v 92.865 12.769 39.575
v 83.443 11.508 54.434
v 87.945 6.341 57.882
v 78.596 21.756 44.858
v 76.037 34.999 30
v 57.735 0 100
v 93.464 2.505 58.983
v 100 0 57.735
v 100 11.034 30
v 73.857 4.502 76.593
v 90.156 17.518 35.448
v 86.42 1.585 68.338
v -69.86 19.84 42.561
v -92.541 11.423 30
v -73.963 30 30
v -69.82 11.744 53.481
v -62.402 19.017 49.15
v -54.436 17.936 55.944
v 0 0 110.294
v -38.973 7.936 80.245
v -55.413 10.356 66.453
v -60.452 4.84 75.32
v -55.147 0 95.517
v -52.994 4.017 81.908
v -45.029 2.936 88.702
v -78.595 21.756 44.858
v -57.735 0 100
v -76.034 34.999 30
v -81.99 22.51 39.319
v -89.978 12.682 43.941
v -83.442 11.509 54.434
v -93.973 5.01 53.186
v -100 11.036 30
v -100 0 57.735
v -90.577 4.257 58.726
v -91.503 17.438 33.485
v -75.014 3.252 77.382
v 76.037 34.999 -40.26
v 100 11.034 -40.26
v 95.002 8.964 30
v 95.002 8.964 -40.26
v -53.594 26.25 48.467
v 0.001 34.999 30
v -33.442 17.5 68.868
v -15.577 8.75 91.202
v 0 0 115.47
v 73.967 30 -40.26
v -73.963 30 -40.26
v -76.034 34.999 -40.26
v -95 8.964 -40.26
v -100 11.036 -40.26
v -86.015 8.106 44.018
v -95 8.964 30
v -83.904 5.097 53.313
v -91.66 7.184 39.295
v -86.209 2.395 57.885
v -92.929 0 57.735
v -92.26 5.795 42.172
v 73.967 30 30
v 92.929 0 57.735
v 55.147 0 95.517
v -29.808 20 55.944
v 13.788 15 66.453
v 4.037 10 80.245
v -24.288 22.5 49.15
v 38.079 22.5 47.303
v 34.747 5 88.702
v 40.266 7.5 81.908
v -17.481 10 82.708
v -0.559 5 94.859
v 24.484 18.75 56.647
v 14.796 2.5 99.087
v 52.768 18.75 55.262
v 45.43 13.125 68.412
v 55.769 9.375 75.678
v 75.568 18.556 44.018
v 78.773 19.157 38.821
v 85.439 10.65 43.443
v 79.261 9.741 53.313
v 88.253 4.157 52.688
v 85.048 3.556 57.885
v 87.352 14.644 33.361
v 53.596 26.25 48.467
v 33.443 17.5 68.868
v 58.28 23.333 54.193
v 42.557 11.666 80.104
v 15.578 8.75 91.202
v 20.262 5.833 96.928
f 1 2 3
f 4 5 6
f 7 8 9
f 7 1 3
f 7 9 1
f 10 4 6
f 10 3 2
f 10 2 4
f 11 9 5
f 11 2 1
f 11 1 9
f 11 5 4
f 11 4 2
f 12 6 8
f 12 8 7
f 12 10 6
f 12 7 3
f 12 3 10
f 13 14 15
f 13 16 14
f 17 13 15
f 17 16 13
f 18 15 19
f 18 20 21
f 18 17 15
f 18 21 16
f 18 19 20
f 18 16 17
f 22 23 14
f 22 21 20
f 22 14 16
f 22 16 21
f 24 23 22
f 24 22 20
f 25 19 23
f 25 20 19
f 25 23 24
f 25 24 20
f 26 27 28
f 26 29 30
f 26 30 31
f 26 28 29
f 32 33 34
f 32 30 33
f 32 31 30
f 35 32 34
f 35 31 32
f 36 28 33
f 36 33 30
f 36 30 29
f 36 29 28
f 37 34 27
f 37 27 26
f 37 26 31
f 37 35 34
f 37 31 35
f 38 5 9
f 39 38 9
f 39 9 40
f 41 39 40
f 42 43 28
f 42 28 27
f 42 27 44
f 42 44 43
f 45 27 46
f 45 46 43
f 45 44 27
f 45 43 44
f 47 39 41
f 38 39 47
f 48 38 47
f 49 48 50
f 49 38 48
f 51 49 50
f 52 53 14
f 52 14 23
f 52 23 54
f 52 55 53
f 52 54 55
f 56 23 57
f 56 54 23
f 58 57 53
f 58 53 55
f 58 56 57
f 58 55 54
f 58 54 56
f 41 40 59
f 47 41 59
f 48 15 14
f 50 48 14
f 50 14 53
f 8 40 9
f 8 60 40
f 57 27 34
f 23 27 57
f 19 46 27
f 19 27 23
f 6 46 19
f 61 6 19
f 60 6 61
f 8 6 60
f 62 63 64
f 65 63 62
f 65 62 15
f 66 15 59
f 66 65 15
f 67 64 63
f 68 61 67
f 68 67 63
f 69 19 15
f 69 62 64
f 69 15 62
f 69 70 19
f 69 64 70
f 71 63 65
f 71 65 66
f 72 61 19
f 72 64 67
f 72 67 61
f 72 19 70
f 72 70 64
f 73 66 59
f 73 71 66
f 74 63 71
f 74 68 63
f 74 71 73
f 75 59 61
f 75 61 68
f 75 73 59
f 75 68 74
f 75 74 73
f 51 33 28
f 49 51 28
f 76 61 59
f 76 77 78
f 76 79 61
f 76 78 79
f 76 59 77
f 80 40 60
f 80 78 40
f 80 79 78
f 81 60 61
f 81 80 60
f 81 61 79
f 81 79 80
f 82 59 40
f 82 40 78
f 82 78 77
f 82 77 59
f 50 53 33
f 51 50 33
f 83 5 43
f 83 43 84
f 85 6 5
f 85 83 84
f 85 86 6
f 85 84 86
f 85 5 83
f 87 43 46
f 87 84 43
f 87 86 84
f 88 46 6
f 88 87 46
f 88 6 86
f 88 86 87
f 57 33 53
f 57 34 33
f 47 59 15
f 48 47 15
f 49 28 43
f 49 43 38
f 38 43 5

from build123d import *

# Parameters (mm, degrees)
BOSS_EXTRUDE1_DEPTH = 70.26


with BuildPart() as part:
    # Loft13: read off the stored shape, not the designer's step
    # Loft13: loft between two sections, ruled curve by curve
    loft13_from = [
        Edge.make_bspline([(-100.000171146, 11.035604797, 30), (-99.166809288, 10.690415013, 30), (-98.33344743, 10.345225229, 30), (-96.666723715, 9.654845662, 30), (-95.833361858, 9.309655878, 30), (-95, 8.964466094, 30)], [0, 0, 0, 0, 0.5, 0.5, 1, 1, 1, 1], 3),
        Edge.make_bspline([(-95, 8.964466094, 30), (-94.590223449, 9.374207863, 30), (-94.180446899, 9.783949632, 30), (-93.360893797, 10.603433171, 30), (-92.951117247, 11.01317494, 30), (-92.541340696, 11.422916709, 30)], [0, 0, 0, 0, 0.5, 0.5, 1, 1, 1, 1], 3),
        Edge.make_bspline([(-76.034367882, 34.999373863, 30), (-80.028668426, 31.005412352, 30), (-84.02296897, 27.011450841, 30), (-92.011570058, 19.023527819, 30), (-96.005870602, 15.029566308, 30), (-100.000171146, 11.035604797, 30)], [0, 0, 0, 0, 0.5, 0.5, 1, 1, 1, 1], 3),
        Edge.make_bspline([(-92.541340696, 11.422916709, 30), (-89.444897324, 14.519097257, 30), (-86.348453952, 17.615277806, 30), (-80.155567208, 23.807638903, 30), (-77.059123835, 26.903819451, 30), (-73.962680463, 30, 30)], [0, 0, 0, 0, 0.5, 0.5, 1, 1, 1, 1], 3),
        Edge.make_bspline([(-73.962680463, 30, 30), (-49.307680463, 30, 30), (-24.652680463, 30, 30), (24.657319537, 30, 30), (49.312319537, 30, 30), (73.967319537, 30, 30)], [0, 0, 0, 0, 0.5, 0.5, 1, 1, 1, 1], 3),
        Edge.make_bspline([(73.967319537, 30, 30), (77.473093055, 26.493928889, 30), (80.978866573, 22.987857778, 30), (87.99041361, 15.975715557, 30), (91.496187128, 12.469644446, 30), (95.001960646, 8.963573335, 30)], [0, 0, 0, 0, 0.5, 0.5, 1, 1, 1, 1], 3),
        Edge.make_bspline([(95.001960646, 8.963573335, 30), (95.834992025, 9.30862623, 30), (96.668023403, 9.653679125, 30), (98.33408616, 10.343784915, 30), (99.167117539, 10.68883781, 30), (100.000148917, 11.033890705, 30)], [0, 0, 0, 0, 0.5, 0.5, 1, 1, 1, 1], 3),
        Edge.make_bspline([(100.000148917, 11.033890705, 30), (96.006240753, 15.028137898, 30), (92.012332588, 19.022385091, 30), (84.024516259, 27.010879477, 30), (80.030608095, 31.00512667, 30), (76.03669993, 34.999373863, 30)], [0, 0, 0, 0, 0.5, 0.5, 1, 1, 1, 1], 3),
        Edge.make_bspline([(76.03669993, 34.999373863, 30), (63.364110946, 34.999373863, 30), (50.691521962, 34.999373863, 30), (25.346343993, 34.999373863, 30), (12.673755009, 34.999373863, 30), (0.001166024, 34.999373863, 30)], [0, 0, 0, 0, 0.5, 0.5, 1, 1, 1, 1], 3),
        Edge.make_bspline([(0.001166024, 34.999373863, 30), (-12.67142296, 34.999373863, 30), (-25.344011944, 34.999373863, 30), (-50.689189913, 34.999373863, 30), (-63.361778897, 34.999373863, 30), (-76.034367882, 34.999373863, 30)], [0, 0, 0, 0, 0.5, 0.5, 1, 1, 1, 1], 3),
    ]
    loft13_to = [
        Edge.make_bspline([(-100, 0, 57.735026919), (-98.821488698, 0, 57.735026919), (-97.642977396, 0, 57.735026919), (-95.285954792, 0, 57.735026919), (-94.10744349, 0, 57.735026919), (-92.928932188, 0, 57.735026919)], [0, 0, 0, 0, 0.5, 0.5, 1, 1, 1, 1], 3),
        Edge.make_bspline([(-92.928932188, 0, 57.735026919), (-86.631916235, 0, 64.032042873), (-80.334900281, 0, 70.329058826), (-67.740868375, 0, 82.923090733), (-61.443852421, 0, 89.220106686), (-55.146836468, 0, 95.517122639)], [0, 0, 0, 0, 0.5, 0.5, 1, 1, 1, 1], 3),
        Edge.make_bspline([(-57.735026919, 0, 100), (-64.779189099, 0, 92.95583782), (-71.823351279, 0, 85.91167564), (-85.91167564, 0, 71.82335128), (-92.95583782, 0, 64.7791891), (-100, 0, 57.735026919)], [0, 0, 0, 0, 0.5, 0.5, 1, 1, 1, 1], 3),
        Edge.make_bspline([(-55.146836468, 0, 95.517122639), (-45.955697057, 0, 97.979881022), (-36.764557645, 0, 100.442639405), (-18.382278823, 0, 105.368156171), (-9.191139411, 0, 107.830914553), (0, 0, 110.293672936)], [0, 0, 0, 0, 0.5, 0.5, 1, 1, 1, 1], 3),
        Edge.make_bspline([(0, 0, 110.293672936), (9.191139411, 0, 107.830914553), (18.382278823, 0, 105.368156171), (36.764557645, 0, 100.442639405), (45.955697057, 0, 97.979881022), (55.146836468, 0, 95.517122639)], [0, 0, 0, 0, 0.5, 0.5, 1, 1, 1, 1], 3),
        Edge.make_bspline([(55.146836468, 0, 95.517122639), (61.443852421, 0, 89.220106686), (67.740868375, 0, 82.923090733), (80.334900281, 0, 70.329058826), (86.631916235, 0, 64.032042873), (92.928932188, 0, 57.735026919)], [0, 0, 0, 0, 0.5, 0.5, 1, 1, 1, 1], 3),
        Edge.make_bspline([(92.928932188, 0, 57.735026919), (94.10744349, 0, 57.735026919), (95.285954792, 0, 57.735026919), (97.642977396, 0, 57.735026919), (98.821488698, 0, 57.735026919), (100, 0, 57.735026919)], [0, 0, 0, 0, 0.5, 0.5, 1, 1, 1, 1], 3),
        Edge.make_bspline([(100, 0, 57.735026919), (92.95583782, 0, 64.7791891), (85.91167564, 0, 71.82335128), (71.823351279, 0, 85.91167564), (64.779189099, 0, 92.95583782), (57.735026919, 0, 100)], [0, 0, 0, 0, 0.5, 0.5, 1, 1, 1, 1], 3),
        Edge.make_bspline([(57.735026919, 0, 100), (48.112522433, 0, 102.578342307), (38.490017946, 0, 105.156684613), (19.245008973, 0, 110.313369226), (9.622504487, 0, 112.891711532), (0, 0, 115.470053838)], [0, 0, 0, 0, 0.5, 0.5, 1, 1, 1, 1], 3),
        Edge.make_bspline([(0, 0, 115.470053838), (-9.622504487, 0, 112.891711532), (-19.245008973, 0, 110.313369226), (-38.490017946, 0, 105.156684613), (-48.112522433, 0, 102.578342307), (-57.735026919, 0, 100)], [0, 0, 0, 0, 0.5, 0.5, 1, 1, 1, 1], 3),
    ]
    loft13 = Solid(Shell([*[Face.make_surface_from_curves(loft13_from[k], loft13_to[k]) for k in range(10)], Face(Wire(loft13_from)), Face(Wire(loft13_to))]))
    add(loft13)

    # Sketch9 → Boss-Extrude1 (add)
    with BuildSketch(Plane.XY.offset(30)):
        Polygon((100.000148917, 11.033890705), (95.001960646, 8.963573335), (73.967319537, 30), (-73.962680463, 30), (-95, 8.964466094), (-100.000171146, 11.035604797), (-76.034367882, 34.999373863), (76.03669993, 34.999373863), align=None)
    extrude(amount=-BOSS_EXTRUDE1_DEPTH)


solid = part.part
